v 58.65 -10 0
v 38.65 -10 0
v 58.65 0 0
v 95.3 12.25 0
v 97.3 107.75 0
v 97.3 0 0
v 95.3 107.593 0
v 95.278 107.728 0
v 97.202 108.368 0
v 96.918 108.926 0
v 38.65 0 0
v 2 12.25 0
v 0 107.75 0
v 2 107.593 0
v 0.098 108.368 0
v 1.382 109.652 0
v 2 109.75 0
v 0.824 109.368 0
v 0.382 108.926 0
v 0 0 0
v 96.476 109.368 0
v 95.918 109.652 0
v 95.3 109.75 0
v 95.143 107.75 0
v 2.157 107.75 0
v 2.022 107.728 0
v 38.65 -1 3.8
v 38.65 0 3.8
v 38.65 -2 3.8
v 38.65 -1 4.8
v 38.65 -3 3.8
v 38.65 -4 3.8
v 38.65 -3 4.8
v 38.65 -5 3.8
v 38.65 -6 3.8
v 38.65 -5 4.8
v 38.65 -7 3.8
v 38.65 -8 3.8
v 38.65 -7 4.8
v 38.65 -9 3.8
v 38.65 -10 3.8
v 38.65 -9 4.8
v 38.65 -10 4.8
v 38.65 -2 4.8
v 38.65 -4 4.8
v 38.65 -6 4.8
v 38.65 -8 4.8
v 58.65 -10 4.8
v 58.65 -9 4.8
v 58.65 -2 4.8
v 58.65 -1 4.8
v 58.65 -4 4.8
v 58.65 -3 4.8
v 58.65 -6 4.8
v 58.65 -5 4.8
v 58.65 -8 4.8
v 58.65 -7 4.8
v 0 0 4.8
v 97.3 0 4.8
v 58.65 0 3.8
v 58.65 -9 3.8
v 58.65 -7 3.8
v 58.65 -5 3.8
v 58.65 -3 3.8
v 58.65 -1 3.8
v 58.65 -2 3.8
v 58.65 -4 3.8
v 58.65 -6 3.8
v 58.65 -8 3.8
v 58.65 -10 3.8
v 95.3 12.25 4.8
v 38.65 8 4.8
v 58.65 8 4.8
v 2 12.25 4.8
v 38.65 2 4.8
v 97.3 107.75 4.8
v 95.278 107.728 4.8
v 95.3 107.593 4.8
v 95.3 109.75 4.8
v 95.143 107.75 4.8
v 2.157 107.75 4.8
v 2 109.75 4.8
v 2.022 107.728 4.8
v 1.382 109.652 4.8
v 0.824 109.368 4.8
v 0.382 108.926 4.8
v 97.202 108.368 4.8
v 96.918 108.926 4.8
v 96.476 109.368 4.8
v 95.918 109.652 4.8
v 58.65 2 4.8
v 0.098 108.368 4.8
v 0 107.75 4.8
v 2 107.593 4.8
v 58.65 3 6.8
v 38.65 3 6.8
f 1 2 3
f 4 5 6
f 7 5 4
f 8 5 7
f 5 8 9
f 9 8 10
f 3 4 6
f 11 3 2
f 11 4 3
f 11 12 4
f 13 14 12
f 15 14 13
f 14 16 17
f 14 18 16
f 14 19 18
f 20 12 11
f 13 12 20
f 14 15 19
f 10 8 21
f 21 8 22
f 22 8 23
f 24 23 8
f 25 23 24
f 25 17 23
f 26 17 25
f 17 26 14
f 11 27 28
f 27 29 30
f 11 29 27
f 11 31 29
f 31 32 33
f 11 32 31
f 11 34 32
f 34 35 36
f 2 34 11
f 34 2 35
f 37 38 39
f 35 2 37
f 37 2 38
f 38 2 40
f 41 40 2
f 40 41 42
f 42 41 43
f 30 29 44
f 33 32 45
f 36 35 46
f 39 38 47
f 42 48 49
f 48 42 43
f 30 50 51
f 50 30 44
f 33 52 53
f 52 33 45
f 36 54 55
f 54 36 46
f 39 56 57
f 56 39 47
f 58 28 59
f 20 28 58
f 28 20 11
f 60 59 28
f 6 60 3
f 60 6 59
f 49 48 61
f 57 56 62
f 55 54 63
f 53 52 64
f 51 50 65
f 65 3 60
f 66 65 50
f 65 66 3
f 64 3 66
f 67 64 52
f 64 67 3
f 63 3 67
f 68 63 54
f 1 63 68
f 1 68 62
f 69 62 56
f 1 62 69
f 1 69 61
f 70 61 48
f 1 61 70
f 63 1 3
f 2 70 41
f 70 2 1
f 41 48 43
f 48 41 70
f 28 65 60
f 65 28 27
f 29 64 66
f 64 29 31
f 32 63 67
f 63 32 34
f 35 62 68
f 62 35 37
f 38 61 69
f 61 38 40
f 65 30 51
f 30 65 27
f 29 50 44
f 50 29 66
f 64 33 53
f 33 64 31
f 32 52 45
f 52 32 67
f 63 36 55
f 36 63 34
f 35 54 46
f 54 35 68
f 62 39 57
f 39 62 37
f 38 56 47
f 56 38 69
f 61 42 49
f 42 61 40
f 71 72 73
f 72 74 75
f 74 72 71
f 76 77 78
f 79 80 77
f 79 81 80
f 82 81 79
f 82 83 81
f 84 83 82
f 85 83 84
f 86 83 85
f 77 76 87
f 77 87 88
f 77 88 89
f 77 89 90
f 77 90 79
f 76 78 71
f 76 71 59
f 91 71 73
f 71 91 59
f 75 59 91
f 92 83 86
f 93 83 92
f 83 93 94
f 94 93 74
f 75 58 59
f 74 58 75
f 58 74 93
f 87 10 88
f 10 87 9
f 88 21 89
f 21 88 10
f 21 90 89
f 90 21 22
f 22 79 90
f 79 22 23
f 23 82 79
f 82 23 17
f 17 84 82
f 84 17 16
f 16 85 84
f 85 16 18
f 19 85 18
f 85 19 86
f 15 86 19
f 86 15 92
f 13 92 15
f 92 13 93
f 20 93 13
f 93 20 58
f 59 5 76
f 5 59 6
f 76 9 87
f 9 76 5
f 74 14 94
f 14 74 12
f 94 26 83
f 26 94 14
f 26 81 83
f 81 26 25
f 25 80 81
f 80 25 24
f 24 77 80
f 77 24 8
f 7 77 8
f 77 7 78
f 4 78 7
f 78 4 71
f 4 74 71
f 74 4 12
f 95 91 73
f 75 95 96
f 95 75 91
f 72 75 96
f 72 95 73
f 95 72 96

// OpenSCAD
// file: ../lib/utils.scad
include <params.scad>;

function tol(val) = val - tolerance;

module cone(r, angle, invert=false) {
    h = tan((180 - angle) / 2) * r;
    translate([0, 0, -h]) {
        if (invert) {
                cylinder(r1=r,r2=0,h=h, $fn=20); 
        } else {
            cylinder(r1=0,r2=r,h=h, $fn=20); 
        }
    }
}

module roundrect(vect, r, $fn=20) {
    sq = len(vect) > 1
        ? [for (i = [0:1:len(vect)-1]) vect[i] - r * 2]
        : vect - r * 2;
    minkowski() {
        square(sq);
        translate([r, r])
            circle(r=r);
    }
}

module profile($fn=20) {
    minkowski() {
        translate([fan_case_radius, fan_case_radius, 0])
            square(fan_case - fan_case_radius * 2);
        circle(fan_case_radius, $fn);
    }
}

module fan_mount_points(radius, $fn=20) {
    offset = (fan_case - fan_screw_distance) / 2;
    translate([offset, offset, 0]) {
        circle(radius, $fn);
        translate([fan_screw_distance, 0, 0])
            circle(radius, $fn);
        translate([fan_screw_distance, fan_screw_distance, 0])
            circle(radius, $fn);
        translate([0, fan_screw_distance, 0])
            circle(radius, $fn);
    }
}

module square_grill(width, height, fin_width, fin_count) {
    fin_spacing = width / fin_count;
    difference() {
        square(width);
        union() {
            for (i = [0:1:fin_count]) {
                translate([(i + 1) * fin_spacing - (fin_spacing / 2) - (fin_width / 2), 0, 0])
                    square([fin_width, height]);
            }
        }
    }
}

module bushing(outer_r, inner_r, h) {
    linear_extrude(h)
        difference() {
            circle(r=outer_r);
            circle(r=inner_r);
        }
}

module screw_at_origin(r, d, l, head, head_d, cap, angle) {
    translate([0, 0, -l])
        screw(r, d, l, head, head_d, cap, angle);
}

module screw(r, d, l, head, head_d, cap, angle, fn=20, head_fn) {
    radius = r > 0 ? r : d / 2;
    head_r = head > 0 ? head : head_d / 2;
    hfn = head_fn ? head_fn : fn;

    union() {
        if (angle) {
            translate([0, 0, l])
                cone(head_r, angle, false);
        }
        linear_extrude(l)
            circle(r=radius, $fn=fn);
        if (cap > 0) {
            translate([0, 0, l - cap])
                linear_extrude(cap)
                    circle(r=head_r, $fn=hfn);
        }
    }
}

module inset_screw(r, d, l, head, head_d, cap, angle, inset, fn=20, head_fn) {
    screw_height = l - inset;
    head_r = head > 0 ? head : head_d / 2;

    union() {
        screw(
            r=r,
            d=d,
            l=screw_height,
            head=head_r,
            cap=cap,
            angle=angle,
            fn=fn,
            head_fn=head_fn
        );
        translate([0, 0, screw_height])
            linear_extrude(inset)
                circle(r=head_r, $fn=fn);
    }
}

function inch_to_mm(inches) = inches * 25.4;
// file: ../lib/params.scad
/*************/
/** Exhaust **/
/*************/

/**
 * Fan case sizes: used for all fan parts, including adapters, inlets
 * grills.
 */
fan_case = 120;
fan_screw_distance = 105;
fan_case_depth = 25;
fan_case_radius = 5;
fan_case_screw_radius = 2.5;
fan_case_socket_cap_radius = 5.6 / 2;
fan_case_screw_head_radius = 3;
fan_case_screw_head_angle = 90;

/**
 * Fan grill
 */
grill_screw_size = 3;
grill_screw_radius = grill_screw_size / 2;
grill_screw_inset = 2;
grill_radius = 114 / 2;
grill_fin_offset = 10;
grill_fin_thickness = 2;
grill_fin_degrees = 30;

rear_grill_thickness = 2;

front_grill_thickness = 2;
front_grill_fin_count = 6;
front_grill_fin_thickness = 2;

/**
 * Fan duct filter
 */
filter_thickness = 5;
filter_width = fan_screw_distance - fan_case_screw_radius * 3;
filter_offset = (fan_case - filter_width) / 2;

base_retainer_thickness = 2;
base_height = 30;
base_cut_offset = 10;
base_retainer_inset = 4;

/**
 * Fan to duct adapter
 */
adapter_thickness = 2;
adapter_duct_in = 4;
adapter_height = 14;
adapter_duct_height = 50;
flat_adapter_duct_height = 50;
flat_adapter_screw_radius = 2;
flat_adapter_screw_head_radius = 4;

/**
 * Fan adapter filter caddy
 */
caddy_thickness = 2;
caddy_handle_width = 20;
caddy_handle_depth = 10;
caddy_handle_grip_count = 5;
caddy_handle_grip_depth = 1;
caddy_handle_grip_width = 1;
caddy_clip_height = 2;
caddy_clip_depth = 6;
caddy_clip_offset = 1;

/***************/
/** Enclosure **/
/***************/

/**
 * Enclosure foot
 */
foot_lower_radius = 15;
foot_upper_radius = 20;
foot_height = 18;
foot_inset_radius = 4;
foot_inset_depth = 3;
foot_screw_radius = 4;
foot_screw_inset = 6;
foot_screw_head_radius = 8;

/**
 * Power supply attachment
 */
power_supply_case_thickness = 3.0;
power_supply_screw_radius = 1.5;
power_supply_bushing_radius = 7.5;

power_supply_cable_pass_width = 18;
power_supply_cable_pass_height = 5;
power_supply_cable_pass_overhang = 5;
power_supply_cable_pass_overhang_depth = power_supply_case_thickness;
power_supply_cable_pass_depth = 3;
power_supply_cable_pass_thickness = 3;

/**************/
/** Filament **/
/**************/

/**
 * Filament case passthrough
 */
through_base_width = 60;
through_base_height = 20;
through_base_depth = 5;
through_base_screw_offset = 10;
through_base_screw_radius = 1.5;
through_base_screw_head = 2.8;
through_base_nut_head = 3.25;
through_base_nut_inset = 3;
through_base_screw_inset = 3;
through_base_fitting_d = 5;
case_thickness = 1;
case_through_radius = 6;
filament_radius = 1;

inlet_length = 10;
inlet_outer_radius = 3;
inlet_inner_radius = 2;
inlet_angle = -20;


/**********/
/** Misc **/
/**********/

// tolerance is used all over the place to decide how closely parts fit
// together; adjust to the tolerances of your printer. 0.2 works fine for
// a Prusa i3 MK3.
tolerance = 0.2;
// main file
include <../lib/params.scad>;
use <../lib/utils.scad>;

caddy_width = filter_width - tolerance;
caddy_height = filter_thickness - tolerance;
caddy_depth = filter_width + filter_offset + front_grill_fin_thickness / 2;
caddy_vec = [caddy_width, caddy_depth];
caddy_front_set = caddy_depth - filter_width;
caddy_handle_offset = caddy_width / 2 - caddy_handle_width / 2;

module caddy_profile() {
    union() {
        square([caddy_width, caddy_depth / 2]);
        roundrect(caddy_vec, 2);
    }
}

union() {
    linear_extrude(height=caddy_height)
        union() {
            // base
            difference() {
                caddy_profile();
                offset(r=-caddy_thickness)
                    caddy_profile();
            }
            // front set
            square([caddy_width, caddy_front_set]);
        }
    // handle
    difference() {
        // handle body
        linear_extrude(height=caddy_height)
            translate([caddy_handle_offset, -caddy_handle_depth, 0])
                square([caddy_handle_width, caddy_handle_depth]);
        // grip cutouts
        translate([caddy_handle_offset, -caddy_handle_grip_width, caddy_height-caddy_handle_grip_depth])
            linear_extrude(height=caddy_handle_grip_depth) {
                for (i = [0:1:caddy_handle_grip_count]) {
                    translate([0, i*(-caddy_handle_grip_width-caddy_handle_grip_depth), 0])
                        square([caddy_handle_width, caddy_handle_grip_width]);
                }
            }
    }
    // clip
    translate([caddy_handle_offset + caddy_handle_width, adapter_thickness, caddy_height])
        rotate([0, -90, 0])
            linear_extrude(height=caddy_handle_width)
                polygon([[0, 0], [0, caddy_clip_depth], [caddy_clip_height, caddy_clip_offset]]);
}
